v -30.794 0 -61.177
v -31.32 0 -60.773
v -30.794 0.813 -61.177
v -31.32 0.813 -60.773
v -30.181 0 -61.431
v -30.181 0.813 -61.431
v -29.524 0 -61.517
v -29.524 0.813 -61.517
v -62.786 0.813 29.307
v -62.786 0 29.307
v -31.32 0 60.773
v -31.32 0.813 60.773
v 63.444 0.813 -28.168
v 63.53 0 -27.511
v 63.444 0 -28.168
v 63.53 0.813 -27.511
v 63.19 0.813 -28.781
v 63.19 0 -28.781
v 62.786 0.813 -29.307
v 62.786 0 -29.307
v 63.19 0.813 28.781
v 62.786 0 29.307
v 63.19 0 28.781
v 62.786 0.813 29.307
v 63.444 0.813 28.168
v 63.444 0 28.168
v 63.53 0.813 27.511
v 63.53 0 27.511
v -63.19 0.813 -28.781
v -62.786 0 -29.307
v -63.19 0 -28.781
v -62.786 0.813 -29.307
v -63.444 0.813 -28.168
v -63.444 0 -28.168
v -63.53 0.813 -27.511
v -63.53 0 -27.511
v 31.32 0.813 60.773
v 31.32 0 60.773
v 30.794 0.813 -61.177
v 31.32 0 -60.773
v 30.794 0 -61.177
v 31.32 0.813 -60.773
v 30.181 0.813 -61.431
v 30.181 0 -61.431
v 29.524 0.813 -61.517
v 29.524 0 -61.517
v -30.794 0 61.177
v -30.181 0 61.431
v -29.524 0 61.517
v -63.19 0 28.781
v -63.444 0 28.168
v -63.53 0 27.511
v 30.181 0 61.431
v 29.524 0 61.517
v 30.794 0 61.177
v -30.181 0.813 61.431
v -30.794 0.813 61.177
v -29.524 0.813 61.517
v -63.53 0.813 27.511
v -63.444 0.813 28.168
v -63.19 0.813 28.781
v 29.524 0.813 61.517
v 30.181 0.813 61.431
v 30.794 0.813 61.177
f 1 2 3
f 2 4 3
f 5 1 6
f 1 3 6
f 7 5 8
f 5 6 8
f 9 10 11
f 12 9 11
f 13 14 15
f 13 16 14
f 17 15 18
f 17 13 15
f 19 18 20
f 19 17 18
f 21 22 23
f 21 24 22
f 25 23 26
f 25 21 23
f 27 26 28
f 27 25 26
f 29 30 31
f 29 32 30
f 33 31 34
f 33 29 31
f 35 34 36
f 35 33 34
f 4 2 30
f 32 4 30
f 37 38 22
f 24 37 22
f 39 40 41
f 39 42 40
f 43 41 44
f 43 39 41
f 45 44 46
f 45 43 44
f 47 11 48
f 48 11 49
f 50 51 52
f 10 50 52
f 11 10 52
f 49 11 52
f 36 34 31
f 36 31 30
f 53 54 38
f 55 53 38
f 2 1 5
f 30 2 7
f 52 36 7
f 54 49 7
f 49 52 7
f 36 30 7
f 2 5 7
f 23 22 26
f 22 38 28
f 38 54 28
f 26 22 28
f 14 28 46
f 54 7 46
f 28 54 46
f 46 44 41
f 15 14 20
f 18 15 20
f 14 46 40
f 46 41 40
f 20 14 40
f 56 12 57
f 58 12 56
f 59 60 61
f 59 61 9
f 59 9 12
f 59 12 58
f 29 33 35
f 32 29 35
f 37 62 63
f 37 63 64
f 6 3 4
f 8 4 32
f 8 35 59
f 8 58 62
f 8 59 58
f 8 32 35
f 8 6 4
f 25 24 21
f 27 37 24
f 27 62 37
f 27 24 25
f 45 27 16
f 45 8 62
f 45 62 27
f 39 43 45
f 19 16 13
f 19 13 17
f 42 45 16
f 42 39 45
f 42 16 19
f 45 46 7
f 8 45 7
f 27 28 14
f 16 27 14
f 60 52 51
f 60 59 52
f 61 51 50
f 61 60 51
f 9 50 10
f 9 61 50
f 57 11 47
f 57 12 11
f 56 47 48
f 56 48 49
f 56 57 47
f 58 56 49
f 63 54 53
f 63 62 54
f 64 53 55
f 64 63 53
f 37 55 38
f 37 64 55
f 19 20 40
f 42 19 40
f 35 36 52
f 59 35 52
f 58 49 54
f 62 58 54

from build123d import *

# Parameters (mm, degrees)
EXTRUDE1_DEPTH = 0.8128
FILLET1_R      = 2.54


with BuildPart() as part:
    # Sketch1 → Extrude1 (new body)
    with BuildSketch(Plane(origin=(0, 0, 0), x_dir=(1, 0, 0), z_dir=(0, 1, 0))):
        Polygon((-30.576142977, 61.517339059), (-63.530339059, 28.563142977), (-63.530339059, -28.563142977), (-30.576142977, -61.517339059), (30.576142977, -61.517339059), (63.530339059, -28.563142977), (63.530339059, 28.563142977), (30.576142977, 61.517339059), align=None)
    extrude(amount=EXTRUDE1_DEPTH)

    # Fillet1
    fillet1_edges = [part.edges().sort_by_distance(p)[0] for p in [
        (30.576142977, 0.4064, -61.517339059),
        (63.530339059, 0.4064, -28.563142977),
        (63.530339059, 0.4064, 28.563142977),
        (30.576142977, 0.4064, 61.517339059),
        (-30.576142977, 0.4064, 61.517339059),
        (-63.530339059, 0.4064, 28.563142977),
        (-63.530339059, 0.4064, -28.563142977),
        (-30.576142977, 0.4064, -61.517339059),
    ]]
    fillet(fillet1_edges, radius=FILLET1_R)


solid = part.part
